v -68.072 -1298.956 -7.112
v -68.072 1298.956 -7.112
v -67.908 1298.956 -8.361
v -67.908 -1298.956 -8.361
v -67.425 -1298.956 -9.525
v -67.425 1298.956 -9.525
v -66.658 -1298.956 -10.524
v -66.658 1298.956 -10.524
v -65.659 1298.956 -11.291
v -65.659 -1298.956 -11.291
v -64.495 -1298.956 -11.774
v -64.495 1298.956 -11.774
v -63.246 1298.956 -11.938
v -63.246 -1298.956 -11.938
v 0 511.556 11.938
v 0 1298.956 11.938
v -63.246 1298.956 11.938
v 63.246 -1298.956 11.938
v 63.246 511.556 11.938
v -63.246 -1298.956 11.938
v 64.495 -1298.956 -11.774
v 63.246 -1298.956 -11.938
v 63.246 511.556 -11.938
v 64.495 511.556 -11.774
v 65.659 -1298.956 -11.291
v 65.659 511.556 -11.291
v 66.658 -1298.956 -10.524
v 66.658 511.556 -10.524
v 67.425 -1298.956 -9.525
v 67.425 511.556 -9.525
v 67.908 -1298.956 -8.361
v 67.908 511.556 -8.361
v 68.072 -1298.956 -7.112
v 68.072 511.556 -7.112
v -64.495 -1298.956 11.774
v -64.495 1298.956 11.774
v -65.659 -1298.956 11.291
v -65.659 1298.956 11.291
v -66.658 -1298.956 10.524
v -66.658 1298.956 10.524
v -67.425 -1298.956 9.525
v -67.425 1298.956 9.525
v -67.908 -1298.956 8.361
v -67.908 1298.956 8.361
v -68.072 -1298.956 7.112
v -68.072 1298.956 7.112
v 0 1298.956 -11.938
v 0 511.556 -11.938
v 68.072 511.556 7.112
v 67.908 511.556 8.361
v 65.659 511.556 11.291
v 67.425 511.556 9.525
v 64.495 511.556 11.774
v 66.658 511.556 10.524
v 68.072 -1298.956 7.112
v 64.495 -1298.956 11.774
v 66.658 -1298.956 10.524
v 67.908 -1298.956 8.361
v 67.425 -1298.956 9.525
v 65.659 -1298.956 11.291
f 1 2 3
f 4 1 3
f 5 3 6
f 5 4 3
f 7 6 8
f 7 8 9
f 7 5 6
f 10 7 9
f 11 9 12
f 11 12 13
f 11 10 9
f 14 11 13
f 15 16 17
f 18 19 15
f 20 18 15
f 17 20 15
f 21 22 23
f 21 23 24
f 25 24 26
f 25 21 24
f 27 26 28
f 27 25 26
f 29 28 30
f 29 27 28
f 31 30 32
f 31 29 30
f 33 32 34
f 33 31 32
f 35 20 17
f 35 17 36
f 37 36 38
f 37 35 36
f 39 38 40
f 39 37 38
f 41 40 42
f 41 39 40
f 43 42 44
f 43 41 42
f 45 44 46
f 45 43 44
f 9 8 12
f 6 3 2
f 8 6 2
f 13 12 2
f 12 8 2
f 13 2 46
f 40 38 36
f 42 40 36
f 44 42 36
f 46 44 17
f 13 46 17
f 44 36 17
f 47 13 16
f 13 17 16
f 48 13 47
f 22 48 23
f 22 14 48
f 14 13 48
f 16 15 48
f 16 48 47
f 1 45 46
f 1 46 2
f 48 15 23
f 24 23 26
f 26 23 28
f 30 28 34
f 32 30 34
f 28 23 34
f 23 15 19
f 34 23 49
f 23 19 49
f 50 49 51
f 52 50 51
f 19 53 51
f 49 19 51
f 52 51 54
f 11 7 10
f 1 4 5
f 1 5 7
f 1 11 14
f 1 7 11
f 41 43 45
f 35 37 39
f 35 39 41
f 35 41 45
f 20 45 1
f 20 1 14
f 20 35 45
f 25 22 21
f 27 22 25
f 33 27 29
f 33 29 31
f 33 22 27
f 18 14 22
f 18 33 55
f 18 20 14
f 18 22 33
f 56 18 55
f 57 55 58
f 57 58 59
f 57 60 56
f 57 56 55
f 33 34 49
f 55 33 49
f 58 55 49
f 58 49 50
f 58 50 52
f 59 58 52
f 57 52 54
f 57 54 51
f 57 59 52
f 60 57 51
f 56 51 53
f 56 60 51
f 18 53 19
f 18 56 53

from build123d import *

# Parameters (mm, degrees)
F1_DEPTH = 1298.956
F2_W     = 113.868274
F2_H     = 929.21856
F3_DEPTH = 23.877


with BuildPart() as f1:
    # F0 (on Front) → F1 (new body, symmetric)
    with BuildSketch(Plane.XZ):
        with BuildLine():
            Line((63.246, 11.938), (-63.246, 11.938))
            ThreePointArc((-63.246, 11.938), (-66.658497, 10.524497), (-68.072, 7.112))
            Line((-68.072, 7.112), (-68.072, -7.112))
            ThreePointArc((-68.072, -7.112), (-66.658497, -10.524497), (-63.246, -11.938))
            Line((-63.246, -11.938), (63.246, -11.938))
            ThreePointArc((63.246, -11.938), (66.658497, -10.524497), (68.072, -7.112))
            Line((68.072, -7.112), (68.072, 7.112))
            ThreePointArc((68.072, 7.112), (66.658497, 10.524497), (63.246, 11.938))
        make_face()
    extrude(amount=F1_DEPTH, both=True)

    # F2 (on face) → F3 (cut, through all)
    with BuildSketch(Plane.XY.offset(11.938)):
        with Locations((56.934137, 976.16528)):
            Rectangle(F2_W, F2_H)
    extrude(amount=-F3_DEPTH, mode=Mode.SUBTRACT)


solid = f1.part
